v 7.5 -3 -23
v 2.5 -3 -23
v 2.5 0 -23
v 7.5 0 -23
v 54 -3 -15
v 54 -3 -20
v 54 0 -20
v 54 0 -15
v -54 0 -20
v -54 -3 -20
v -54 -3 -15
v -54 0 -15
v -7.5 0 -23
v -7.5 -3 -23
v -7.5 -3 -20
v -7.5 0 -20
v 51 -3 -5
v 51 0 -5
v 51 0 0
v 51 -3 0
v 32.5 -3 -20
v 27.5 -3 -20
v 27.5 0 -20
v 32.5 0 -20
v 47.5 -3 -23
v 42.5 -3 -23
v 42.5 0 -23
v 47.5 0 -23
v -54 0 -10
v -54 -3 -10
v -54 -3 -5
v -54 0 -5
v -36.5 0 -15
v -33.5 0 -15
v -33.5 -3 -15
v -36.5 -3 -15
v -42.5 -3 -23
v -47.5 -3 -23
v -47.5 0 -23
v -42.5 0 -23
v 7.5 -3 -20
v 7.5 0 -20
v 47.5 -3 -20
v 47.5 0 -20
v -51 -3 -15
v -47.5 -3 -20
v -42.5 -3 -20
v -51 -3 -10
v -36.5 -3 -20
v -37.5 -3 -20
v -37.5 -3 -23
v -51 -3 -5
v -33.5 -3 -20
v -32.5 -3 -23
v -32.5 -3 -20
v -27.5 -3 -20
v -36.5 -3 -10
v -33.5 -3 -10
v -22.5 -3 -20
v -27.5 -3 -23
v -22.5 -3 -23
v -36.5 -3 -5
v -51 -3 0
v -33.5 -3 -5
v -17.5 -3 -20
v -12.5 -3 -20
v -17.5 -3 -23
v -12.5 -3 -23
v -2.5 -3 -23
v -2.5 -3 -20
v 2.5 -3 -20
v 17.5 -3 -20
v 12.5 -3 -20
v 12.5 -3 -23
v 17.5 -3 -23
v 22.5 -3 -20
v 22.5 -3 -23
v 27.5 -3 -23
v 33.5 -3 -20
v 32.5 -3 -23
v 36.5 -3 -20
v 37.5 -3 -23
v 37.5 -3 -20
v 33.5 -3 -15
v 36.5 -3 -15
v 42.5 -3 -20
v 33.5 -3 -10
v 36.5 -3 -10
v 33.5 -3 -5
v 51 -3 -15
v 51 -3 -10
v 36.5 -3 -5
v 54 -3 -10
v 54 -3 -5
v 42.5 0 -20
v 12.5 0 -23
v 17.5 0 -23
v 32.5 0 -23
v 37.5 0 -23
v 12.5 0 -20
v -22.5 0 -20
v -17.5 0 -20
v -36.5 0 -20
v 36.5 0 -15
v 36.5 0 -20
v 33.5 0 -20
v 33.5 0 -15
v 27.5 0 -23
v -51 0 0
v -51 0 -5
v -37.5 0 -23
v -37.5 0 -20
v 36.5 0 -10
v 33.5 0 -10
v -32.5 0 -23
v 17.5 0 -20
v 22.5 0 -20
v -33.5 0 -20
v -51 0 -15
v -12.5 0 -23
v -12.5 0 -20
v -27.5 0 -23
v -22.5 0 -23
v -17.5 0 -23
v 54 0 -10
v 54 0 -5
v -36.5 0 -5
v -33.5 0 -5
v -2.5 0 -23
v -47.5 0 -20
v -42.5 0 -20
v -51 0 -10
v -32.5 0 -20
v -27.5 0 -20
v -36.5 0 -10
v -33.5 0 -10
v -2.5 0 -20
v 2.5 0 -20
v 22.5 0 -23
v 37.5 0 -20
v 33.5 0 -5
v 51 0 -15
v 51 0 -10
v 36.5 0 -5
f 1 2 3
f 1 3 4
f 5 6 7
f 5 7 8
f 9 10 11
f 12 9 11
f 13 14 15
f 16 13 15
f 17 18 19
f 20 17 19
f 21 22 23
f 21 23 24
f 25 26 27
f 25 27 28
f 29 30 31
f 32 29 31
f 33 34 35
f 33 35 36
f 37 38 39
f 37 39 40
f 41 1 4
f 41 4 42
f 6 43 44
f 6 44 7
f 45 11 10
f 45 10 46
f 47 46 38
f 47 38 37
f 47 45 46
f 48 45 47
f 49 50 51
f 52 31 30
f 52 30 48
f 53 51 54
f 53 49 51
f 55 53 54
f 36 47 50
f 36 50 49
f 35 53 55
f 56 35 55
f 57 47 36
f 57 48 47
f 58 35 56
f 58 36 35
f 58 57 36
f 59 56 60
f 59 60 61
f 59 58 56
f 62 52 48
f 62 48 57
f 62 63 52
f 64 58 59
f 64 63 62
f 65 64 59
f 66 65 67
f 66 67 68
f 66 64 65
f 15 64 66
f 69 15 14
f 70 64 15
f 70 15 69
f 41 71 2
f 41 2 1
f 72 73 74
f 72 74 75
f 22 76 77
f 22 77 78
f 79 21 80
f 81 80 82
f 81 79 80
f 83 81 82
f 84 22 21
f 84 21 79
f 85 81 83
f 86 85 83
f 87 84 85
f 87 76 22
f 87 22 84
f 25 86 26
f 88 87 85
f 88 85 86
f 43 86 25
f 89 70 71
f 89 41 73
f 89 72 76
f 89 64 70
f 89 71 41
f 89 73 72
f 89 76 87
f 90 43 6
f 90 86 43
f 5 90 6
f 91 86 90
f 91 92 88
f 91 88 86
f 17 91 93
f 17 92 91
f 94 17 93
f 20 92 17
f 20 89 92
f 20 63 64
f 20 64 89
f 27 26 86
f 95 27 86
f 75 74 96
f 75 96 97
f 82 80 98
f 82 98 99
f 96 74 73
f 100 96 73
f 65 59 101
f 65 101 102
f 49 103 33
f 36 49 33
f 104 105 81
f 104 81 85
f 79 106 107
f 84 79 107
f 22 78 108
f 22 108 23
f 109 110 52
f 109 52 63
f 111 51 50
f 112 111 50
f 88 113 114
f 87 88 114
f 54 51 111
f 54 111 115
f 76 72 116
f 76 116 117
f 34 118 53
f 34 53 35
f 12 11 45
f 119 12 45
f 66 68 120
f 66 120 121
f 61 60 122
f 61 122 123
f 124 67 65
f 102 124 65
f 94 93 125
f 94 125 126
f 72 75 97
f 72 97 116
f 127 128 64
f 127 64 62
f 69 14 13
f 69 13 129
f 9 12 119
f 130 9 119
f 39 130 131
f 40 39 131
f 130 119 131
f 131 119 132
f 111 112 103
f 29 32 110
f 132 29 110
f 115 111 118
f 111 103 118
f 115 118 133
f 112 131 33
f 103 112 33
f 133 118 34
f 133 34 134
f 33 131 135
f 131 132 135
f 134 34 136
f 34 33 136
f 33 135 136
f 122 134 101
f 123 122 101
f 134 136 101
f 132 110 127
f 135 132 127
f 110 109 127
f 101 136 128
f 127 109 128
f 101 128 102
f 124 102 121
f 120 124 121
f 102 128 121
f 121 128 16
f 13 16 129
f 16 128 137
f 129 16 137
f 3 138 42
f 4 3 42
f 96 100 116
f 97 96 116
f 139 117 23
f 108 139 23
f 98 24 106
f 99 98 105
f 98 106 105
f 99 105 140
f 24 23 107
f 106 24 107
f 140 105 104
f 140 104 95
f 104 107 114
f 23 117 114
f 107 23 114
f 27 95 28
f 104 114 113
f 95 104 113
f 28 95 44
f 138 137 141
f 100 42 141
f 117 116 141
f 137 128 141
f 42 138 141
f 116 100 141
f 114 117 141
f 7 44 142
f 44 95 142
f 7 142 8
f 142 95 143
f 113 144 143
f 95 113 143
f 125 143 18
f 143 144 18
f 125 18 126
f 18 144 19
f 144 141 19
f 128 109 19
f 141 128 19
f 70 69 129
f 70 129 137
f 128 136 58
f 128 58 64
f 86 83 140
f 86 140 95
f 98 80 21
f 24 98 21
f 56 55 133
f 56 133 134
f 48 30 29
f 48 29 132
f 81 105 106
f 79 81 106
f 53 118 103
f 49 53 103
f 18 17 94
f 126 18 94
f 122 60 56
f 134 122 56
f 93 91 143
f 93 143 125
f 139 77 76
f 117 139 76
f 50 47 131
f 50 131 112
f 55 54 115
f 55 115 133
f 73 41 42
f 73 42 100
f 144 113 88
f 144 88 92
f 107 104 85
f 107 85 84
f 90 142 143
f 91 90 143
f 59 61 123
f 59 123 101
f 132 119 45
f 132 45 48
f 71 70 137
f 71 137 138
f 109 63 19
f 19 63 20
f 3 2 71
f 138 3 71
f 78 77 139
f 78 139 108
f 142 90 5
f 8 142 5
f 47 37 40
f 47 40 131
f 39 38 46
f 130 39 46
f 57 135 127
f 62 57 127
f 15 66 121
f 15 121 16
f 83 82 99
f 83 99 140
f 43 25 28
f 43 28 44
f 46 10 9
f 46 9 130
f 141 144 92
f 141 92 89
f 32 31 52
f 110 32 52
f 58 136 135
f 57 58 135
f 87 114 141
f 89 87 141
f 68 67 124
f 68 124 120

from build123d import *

# Parameters (mm, degrees)
F0_W     = 102
F0_H     = 40
F1_DEPTH = 3
F2_W     = 3
F2_H     = 5
F3_DEPTH = 3
F4_W     = 5
F4_H     = 3
F5_DEPTH = 3
F6_W     = 114.49237
F6_H     = 23.447346
F7_DEPTH = 25
F8_W     = 3
F8_H     = 5
F9_DEPTH = 25


with BuildPart() as f1:
    # F0 (on Front) → F1 (new body)
    with BuildSketch(Plane.XZ):
        Rectangle(F0_W, F0_H)
    extrude(amount=F1_DEPTH)

    # F2 (on face) → F3 (join)
    with BuildSketch(Plane.XZ.offset(3)):
        with Locations((-52.5, -17.5)):
            Rectangle(F2_W, F2_H)
        with Locations((-52.5, -7.5)):
            Rectangle(F2_W, F2_H)
        with Locations((-52.5, 2.5)):
            Rectangle(F2_W, F2_H)
        with Locations((-52.5, 12.5)):
            Rectangle(F2_W, F2_H)
        with Locations((52.5, -7.5)):
            Rectangle(F2_W, F2_H)
        with Locations((52.5, -17.5)):
            Rectangle(F2_W, F2_H)
        with Locations((52.5, 12.5)):
            Rectangle(F2_W, F2_H)
        with Locations((52.5, 2.5)):
            Rectangle(F2_W, F2_H)
    extrude(amount=-F3_DEPTH)

    # F4 (on face) → F5 (join)
    with BuildSketch(Plane.XZ.offset(3)):
        with Locations((5, -21.5)):
            Rectangle(F4_W, F4_H)
        with Locations((15, -21.5)):
            Rectangle(F4_W, F4_H)
        with Locations((25, -21.5)):
            Rectangle(F4_W, F4_H)
        with Locations((35, -21.5)):
            Rectangle(F4_W, F4_H)
        with Locations((45, -21.5)):
            Rectangle(F4_W, F4_H)
        with Locations((-25, -21.5)):
            Rectangle(F4_W, F4_H)
        with Locations((-15, -21.5)):
            Rectangle(F4_W, F4_H)
        with Locations((-5, -21.5)):
            Rectangle(F4_W, F4_H)
        with Locations((-35, -21.5)):
            Rectangle(F4_W, F4_H)
        with Locations((-45, -21.5)):
            Rectangle(F4_W, F4_H)
    extrude(amount=-F5_DEPTH)

    # F6 (on face) → F7 (cut)
    with BuildSketch(Plane.XZ.offset(3)):
        with Locations((3.246185, 11.723673)):
            Rectangle(F6_W, F6_H)
    extrude(amount=-F7_DEPTH, mode=Mode.SUBTRACT)

    # F8 (on face) → F9 (cut)
    with BuildSketch(Plane(origin=(0, 0, 0), x_dir=(-1, 0, 0), z_dir=(0, 1, 0))):
        with Locations((-35, -17.5)):
            Rectangle(F8_W, F8_H)
        with Locations((-35, -7.5)):
            Rectangle(F8_W, F8_H)
        with Locations((35, -7.5)):
            Rectangle(F8_W, F8_H)
        with Locations((35, -17.5)):
            Rectangle(F8_W, F8_H)
    extrude(amount=-F9_DEPTH, mode=Mode.SUBTRACT)


solid = f1.part
